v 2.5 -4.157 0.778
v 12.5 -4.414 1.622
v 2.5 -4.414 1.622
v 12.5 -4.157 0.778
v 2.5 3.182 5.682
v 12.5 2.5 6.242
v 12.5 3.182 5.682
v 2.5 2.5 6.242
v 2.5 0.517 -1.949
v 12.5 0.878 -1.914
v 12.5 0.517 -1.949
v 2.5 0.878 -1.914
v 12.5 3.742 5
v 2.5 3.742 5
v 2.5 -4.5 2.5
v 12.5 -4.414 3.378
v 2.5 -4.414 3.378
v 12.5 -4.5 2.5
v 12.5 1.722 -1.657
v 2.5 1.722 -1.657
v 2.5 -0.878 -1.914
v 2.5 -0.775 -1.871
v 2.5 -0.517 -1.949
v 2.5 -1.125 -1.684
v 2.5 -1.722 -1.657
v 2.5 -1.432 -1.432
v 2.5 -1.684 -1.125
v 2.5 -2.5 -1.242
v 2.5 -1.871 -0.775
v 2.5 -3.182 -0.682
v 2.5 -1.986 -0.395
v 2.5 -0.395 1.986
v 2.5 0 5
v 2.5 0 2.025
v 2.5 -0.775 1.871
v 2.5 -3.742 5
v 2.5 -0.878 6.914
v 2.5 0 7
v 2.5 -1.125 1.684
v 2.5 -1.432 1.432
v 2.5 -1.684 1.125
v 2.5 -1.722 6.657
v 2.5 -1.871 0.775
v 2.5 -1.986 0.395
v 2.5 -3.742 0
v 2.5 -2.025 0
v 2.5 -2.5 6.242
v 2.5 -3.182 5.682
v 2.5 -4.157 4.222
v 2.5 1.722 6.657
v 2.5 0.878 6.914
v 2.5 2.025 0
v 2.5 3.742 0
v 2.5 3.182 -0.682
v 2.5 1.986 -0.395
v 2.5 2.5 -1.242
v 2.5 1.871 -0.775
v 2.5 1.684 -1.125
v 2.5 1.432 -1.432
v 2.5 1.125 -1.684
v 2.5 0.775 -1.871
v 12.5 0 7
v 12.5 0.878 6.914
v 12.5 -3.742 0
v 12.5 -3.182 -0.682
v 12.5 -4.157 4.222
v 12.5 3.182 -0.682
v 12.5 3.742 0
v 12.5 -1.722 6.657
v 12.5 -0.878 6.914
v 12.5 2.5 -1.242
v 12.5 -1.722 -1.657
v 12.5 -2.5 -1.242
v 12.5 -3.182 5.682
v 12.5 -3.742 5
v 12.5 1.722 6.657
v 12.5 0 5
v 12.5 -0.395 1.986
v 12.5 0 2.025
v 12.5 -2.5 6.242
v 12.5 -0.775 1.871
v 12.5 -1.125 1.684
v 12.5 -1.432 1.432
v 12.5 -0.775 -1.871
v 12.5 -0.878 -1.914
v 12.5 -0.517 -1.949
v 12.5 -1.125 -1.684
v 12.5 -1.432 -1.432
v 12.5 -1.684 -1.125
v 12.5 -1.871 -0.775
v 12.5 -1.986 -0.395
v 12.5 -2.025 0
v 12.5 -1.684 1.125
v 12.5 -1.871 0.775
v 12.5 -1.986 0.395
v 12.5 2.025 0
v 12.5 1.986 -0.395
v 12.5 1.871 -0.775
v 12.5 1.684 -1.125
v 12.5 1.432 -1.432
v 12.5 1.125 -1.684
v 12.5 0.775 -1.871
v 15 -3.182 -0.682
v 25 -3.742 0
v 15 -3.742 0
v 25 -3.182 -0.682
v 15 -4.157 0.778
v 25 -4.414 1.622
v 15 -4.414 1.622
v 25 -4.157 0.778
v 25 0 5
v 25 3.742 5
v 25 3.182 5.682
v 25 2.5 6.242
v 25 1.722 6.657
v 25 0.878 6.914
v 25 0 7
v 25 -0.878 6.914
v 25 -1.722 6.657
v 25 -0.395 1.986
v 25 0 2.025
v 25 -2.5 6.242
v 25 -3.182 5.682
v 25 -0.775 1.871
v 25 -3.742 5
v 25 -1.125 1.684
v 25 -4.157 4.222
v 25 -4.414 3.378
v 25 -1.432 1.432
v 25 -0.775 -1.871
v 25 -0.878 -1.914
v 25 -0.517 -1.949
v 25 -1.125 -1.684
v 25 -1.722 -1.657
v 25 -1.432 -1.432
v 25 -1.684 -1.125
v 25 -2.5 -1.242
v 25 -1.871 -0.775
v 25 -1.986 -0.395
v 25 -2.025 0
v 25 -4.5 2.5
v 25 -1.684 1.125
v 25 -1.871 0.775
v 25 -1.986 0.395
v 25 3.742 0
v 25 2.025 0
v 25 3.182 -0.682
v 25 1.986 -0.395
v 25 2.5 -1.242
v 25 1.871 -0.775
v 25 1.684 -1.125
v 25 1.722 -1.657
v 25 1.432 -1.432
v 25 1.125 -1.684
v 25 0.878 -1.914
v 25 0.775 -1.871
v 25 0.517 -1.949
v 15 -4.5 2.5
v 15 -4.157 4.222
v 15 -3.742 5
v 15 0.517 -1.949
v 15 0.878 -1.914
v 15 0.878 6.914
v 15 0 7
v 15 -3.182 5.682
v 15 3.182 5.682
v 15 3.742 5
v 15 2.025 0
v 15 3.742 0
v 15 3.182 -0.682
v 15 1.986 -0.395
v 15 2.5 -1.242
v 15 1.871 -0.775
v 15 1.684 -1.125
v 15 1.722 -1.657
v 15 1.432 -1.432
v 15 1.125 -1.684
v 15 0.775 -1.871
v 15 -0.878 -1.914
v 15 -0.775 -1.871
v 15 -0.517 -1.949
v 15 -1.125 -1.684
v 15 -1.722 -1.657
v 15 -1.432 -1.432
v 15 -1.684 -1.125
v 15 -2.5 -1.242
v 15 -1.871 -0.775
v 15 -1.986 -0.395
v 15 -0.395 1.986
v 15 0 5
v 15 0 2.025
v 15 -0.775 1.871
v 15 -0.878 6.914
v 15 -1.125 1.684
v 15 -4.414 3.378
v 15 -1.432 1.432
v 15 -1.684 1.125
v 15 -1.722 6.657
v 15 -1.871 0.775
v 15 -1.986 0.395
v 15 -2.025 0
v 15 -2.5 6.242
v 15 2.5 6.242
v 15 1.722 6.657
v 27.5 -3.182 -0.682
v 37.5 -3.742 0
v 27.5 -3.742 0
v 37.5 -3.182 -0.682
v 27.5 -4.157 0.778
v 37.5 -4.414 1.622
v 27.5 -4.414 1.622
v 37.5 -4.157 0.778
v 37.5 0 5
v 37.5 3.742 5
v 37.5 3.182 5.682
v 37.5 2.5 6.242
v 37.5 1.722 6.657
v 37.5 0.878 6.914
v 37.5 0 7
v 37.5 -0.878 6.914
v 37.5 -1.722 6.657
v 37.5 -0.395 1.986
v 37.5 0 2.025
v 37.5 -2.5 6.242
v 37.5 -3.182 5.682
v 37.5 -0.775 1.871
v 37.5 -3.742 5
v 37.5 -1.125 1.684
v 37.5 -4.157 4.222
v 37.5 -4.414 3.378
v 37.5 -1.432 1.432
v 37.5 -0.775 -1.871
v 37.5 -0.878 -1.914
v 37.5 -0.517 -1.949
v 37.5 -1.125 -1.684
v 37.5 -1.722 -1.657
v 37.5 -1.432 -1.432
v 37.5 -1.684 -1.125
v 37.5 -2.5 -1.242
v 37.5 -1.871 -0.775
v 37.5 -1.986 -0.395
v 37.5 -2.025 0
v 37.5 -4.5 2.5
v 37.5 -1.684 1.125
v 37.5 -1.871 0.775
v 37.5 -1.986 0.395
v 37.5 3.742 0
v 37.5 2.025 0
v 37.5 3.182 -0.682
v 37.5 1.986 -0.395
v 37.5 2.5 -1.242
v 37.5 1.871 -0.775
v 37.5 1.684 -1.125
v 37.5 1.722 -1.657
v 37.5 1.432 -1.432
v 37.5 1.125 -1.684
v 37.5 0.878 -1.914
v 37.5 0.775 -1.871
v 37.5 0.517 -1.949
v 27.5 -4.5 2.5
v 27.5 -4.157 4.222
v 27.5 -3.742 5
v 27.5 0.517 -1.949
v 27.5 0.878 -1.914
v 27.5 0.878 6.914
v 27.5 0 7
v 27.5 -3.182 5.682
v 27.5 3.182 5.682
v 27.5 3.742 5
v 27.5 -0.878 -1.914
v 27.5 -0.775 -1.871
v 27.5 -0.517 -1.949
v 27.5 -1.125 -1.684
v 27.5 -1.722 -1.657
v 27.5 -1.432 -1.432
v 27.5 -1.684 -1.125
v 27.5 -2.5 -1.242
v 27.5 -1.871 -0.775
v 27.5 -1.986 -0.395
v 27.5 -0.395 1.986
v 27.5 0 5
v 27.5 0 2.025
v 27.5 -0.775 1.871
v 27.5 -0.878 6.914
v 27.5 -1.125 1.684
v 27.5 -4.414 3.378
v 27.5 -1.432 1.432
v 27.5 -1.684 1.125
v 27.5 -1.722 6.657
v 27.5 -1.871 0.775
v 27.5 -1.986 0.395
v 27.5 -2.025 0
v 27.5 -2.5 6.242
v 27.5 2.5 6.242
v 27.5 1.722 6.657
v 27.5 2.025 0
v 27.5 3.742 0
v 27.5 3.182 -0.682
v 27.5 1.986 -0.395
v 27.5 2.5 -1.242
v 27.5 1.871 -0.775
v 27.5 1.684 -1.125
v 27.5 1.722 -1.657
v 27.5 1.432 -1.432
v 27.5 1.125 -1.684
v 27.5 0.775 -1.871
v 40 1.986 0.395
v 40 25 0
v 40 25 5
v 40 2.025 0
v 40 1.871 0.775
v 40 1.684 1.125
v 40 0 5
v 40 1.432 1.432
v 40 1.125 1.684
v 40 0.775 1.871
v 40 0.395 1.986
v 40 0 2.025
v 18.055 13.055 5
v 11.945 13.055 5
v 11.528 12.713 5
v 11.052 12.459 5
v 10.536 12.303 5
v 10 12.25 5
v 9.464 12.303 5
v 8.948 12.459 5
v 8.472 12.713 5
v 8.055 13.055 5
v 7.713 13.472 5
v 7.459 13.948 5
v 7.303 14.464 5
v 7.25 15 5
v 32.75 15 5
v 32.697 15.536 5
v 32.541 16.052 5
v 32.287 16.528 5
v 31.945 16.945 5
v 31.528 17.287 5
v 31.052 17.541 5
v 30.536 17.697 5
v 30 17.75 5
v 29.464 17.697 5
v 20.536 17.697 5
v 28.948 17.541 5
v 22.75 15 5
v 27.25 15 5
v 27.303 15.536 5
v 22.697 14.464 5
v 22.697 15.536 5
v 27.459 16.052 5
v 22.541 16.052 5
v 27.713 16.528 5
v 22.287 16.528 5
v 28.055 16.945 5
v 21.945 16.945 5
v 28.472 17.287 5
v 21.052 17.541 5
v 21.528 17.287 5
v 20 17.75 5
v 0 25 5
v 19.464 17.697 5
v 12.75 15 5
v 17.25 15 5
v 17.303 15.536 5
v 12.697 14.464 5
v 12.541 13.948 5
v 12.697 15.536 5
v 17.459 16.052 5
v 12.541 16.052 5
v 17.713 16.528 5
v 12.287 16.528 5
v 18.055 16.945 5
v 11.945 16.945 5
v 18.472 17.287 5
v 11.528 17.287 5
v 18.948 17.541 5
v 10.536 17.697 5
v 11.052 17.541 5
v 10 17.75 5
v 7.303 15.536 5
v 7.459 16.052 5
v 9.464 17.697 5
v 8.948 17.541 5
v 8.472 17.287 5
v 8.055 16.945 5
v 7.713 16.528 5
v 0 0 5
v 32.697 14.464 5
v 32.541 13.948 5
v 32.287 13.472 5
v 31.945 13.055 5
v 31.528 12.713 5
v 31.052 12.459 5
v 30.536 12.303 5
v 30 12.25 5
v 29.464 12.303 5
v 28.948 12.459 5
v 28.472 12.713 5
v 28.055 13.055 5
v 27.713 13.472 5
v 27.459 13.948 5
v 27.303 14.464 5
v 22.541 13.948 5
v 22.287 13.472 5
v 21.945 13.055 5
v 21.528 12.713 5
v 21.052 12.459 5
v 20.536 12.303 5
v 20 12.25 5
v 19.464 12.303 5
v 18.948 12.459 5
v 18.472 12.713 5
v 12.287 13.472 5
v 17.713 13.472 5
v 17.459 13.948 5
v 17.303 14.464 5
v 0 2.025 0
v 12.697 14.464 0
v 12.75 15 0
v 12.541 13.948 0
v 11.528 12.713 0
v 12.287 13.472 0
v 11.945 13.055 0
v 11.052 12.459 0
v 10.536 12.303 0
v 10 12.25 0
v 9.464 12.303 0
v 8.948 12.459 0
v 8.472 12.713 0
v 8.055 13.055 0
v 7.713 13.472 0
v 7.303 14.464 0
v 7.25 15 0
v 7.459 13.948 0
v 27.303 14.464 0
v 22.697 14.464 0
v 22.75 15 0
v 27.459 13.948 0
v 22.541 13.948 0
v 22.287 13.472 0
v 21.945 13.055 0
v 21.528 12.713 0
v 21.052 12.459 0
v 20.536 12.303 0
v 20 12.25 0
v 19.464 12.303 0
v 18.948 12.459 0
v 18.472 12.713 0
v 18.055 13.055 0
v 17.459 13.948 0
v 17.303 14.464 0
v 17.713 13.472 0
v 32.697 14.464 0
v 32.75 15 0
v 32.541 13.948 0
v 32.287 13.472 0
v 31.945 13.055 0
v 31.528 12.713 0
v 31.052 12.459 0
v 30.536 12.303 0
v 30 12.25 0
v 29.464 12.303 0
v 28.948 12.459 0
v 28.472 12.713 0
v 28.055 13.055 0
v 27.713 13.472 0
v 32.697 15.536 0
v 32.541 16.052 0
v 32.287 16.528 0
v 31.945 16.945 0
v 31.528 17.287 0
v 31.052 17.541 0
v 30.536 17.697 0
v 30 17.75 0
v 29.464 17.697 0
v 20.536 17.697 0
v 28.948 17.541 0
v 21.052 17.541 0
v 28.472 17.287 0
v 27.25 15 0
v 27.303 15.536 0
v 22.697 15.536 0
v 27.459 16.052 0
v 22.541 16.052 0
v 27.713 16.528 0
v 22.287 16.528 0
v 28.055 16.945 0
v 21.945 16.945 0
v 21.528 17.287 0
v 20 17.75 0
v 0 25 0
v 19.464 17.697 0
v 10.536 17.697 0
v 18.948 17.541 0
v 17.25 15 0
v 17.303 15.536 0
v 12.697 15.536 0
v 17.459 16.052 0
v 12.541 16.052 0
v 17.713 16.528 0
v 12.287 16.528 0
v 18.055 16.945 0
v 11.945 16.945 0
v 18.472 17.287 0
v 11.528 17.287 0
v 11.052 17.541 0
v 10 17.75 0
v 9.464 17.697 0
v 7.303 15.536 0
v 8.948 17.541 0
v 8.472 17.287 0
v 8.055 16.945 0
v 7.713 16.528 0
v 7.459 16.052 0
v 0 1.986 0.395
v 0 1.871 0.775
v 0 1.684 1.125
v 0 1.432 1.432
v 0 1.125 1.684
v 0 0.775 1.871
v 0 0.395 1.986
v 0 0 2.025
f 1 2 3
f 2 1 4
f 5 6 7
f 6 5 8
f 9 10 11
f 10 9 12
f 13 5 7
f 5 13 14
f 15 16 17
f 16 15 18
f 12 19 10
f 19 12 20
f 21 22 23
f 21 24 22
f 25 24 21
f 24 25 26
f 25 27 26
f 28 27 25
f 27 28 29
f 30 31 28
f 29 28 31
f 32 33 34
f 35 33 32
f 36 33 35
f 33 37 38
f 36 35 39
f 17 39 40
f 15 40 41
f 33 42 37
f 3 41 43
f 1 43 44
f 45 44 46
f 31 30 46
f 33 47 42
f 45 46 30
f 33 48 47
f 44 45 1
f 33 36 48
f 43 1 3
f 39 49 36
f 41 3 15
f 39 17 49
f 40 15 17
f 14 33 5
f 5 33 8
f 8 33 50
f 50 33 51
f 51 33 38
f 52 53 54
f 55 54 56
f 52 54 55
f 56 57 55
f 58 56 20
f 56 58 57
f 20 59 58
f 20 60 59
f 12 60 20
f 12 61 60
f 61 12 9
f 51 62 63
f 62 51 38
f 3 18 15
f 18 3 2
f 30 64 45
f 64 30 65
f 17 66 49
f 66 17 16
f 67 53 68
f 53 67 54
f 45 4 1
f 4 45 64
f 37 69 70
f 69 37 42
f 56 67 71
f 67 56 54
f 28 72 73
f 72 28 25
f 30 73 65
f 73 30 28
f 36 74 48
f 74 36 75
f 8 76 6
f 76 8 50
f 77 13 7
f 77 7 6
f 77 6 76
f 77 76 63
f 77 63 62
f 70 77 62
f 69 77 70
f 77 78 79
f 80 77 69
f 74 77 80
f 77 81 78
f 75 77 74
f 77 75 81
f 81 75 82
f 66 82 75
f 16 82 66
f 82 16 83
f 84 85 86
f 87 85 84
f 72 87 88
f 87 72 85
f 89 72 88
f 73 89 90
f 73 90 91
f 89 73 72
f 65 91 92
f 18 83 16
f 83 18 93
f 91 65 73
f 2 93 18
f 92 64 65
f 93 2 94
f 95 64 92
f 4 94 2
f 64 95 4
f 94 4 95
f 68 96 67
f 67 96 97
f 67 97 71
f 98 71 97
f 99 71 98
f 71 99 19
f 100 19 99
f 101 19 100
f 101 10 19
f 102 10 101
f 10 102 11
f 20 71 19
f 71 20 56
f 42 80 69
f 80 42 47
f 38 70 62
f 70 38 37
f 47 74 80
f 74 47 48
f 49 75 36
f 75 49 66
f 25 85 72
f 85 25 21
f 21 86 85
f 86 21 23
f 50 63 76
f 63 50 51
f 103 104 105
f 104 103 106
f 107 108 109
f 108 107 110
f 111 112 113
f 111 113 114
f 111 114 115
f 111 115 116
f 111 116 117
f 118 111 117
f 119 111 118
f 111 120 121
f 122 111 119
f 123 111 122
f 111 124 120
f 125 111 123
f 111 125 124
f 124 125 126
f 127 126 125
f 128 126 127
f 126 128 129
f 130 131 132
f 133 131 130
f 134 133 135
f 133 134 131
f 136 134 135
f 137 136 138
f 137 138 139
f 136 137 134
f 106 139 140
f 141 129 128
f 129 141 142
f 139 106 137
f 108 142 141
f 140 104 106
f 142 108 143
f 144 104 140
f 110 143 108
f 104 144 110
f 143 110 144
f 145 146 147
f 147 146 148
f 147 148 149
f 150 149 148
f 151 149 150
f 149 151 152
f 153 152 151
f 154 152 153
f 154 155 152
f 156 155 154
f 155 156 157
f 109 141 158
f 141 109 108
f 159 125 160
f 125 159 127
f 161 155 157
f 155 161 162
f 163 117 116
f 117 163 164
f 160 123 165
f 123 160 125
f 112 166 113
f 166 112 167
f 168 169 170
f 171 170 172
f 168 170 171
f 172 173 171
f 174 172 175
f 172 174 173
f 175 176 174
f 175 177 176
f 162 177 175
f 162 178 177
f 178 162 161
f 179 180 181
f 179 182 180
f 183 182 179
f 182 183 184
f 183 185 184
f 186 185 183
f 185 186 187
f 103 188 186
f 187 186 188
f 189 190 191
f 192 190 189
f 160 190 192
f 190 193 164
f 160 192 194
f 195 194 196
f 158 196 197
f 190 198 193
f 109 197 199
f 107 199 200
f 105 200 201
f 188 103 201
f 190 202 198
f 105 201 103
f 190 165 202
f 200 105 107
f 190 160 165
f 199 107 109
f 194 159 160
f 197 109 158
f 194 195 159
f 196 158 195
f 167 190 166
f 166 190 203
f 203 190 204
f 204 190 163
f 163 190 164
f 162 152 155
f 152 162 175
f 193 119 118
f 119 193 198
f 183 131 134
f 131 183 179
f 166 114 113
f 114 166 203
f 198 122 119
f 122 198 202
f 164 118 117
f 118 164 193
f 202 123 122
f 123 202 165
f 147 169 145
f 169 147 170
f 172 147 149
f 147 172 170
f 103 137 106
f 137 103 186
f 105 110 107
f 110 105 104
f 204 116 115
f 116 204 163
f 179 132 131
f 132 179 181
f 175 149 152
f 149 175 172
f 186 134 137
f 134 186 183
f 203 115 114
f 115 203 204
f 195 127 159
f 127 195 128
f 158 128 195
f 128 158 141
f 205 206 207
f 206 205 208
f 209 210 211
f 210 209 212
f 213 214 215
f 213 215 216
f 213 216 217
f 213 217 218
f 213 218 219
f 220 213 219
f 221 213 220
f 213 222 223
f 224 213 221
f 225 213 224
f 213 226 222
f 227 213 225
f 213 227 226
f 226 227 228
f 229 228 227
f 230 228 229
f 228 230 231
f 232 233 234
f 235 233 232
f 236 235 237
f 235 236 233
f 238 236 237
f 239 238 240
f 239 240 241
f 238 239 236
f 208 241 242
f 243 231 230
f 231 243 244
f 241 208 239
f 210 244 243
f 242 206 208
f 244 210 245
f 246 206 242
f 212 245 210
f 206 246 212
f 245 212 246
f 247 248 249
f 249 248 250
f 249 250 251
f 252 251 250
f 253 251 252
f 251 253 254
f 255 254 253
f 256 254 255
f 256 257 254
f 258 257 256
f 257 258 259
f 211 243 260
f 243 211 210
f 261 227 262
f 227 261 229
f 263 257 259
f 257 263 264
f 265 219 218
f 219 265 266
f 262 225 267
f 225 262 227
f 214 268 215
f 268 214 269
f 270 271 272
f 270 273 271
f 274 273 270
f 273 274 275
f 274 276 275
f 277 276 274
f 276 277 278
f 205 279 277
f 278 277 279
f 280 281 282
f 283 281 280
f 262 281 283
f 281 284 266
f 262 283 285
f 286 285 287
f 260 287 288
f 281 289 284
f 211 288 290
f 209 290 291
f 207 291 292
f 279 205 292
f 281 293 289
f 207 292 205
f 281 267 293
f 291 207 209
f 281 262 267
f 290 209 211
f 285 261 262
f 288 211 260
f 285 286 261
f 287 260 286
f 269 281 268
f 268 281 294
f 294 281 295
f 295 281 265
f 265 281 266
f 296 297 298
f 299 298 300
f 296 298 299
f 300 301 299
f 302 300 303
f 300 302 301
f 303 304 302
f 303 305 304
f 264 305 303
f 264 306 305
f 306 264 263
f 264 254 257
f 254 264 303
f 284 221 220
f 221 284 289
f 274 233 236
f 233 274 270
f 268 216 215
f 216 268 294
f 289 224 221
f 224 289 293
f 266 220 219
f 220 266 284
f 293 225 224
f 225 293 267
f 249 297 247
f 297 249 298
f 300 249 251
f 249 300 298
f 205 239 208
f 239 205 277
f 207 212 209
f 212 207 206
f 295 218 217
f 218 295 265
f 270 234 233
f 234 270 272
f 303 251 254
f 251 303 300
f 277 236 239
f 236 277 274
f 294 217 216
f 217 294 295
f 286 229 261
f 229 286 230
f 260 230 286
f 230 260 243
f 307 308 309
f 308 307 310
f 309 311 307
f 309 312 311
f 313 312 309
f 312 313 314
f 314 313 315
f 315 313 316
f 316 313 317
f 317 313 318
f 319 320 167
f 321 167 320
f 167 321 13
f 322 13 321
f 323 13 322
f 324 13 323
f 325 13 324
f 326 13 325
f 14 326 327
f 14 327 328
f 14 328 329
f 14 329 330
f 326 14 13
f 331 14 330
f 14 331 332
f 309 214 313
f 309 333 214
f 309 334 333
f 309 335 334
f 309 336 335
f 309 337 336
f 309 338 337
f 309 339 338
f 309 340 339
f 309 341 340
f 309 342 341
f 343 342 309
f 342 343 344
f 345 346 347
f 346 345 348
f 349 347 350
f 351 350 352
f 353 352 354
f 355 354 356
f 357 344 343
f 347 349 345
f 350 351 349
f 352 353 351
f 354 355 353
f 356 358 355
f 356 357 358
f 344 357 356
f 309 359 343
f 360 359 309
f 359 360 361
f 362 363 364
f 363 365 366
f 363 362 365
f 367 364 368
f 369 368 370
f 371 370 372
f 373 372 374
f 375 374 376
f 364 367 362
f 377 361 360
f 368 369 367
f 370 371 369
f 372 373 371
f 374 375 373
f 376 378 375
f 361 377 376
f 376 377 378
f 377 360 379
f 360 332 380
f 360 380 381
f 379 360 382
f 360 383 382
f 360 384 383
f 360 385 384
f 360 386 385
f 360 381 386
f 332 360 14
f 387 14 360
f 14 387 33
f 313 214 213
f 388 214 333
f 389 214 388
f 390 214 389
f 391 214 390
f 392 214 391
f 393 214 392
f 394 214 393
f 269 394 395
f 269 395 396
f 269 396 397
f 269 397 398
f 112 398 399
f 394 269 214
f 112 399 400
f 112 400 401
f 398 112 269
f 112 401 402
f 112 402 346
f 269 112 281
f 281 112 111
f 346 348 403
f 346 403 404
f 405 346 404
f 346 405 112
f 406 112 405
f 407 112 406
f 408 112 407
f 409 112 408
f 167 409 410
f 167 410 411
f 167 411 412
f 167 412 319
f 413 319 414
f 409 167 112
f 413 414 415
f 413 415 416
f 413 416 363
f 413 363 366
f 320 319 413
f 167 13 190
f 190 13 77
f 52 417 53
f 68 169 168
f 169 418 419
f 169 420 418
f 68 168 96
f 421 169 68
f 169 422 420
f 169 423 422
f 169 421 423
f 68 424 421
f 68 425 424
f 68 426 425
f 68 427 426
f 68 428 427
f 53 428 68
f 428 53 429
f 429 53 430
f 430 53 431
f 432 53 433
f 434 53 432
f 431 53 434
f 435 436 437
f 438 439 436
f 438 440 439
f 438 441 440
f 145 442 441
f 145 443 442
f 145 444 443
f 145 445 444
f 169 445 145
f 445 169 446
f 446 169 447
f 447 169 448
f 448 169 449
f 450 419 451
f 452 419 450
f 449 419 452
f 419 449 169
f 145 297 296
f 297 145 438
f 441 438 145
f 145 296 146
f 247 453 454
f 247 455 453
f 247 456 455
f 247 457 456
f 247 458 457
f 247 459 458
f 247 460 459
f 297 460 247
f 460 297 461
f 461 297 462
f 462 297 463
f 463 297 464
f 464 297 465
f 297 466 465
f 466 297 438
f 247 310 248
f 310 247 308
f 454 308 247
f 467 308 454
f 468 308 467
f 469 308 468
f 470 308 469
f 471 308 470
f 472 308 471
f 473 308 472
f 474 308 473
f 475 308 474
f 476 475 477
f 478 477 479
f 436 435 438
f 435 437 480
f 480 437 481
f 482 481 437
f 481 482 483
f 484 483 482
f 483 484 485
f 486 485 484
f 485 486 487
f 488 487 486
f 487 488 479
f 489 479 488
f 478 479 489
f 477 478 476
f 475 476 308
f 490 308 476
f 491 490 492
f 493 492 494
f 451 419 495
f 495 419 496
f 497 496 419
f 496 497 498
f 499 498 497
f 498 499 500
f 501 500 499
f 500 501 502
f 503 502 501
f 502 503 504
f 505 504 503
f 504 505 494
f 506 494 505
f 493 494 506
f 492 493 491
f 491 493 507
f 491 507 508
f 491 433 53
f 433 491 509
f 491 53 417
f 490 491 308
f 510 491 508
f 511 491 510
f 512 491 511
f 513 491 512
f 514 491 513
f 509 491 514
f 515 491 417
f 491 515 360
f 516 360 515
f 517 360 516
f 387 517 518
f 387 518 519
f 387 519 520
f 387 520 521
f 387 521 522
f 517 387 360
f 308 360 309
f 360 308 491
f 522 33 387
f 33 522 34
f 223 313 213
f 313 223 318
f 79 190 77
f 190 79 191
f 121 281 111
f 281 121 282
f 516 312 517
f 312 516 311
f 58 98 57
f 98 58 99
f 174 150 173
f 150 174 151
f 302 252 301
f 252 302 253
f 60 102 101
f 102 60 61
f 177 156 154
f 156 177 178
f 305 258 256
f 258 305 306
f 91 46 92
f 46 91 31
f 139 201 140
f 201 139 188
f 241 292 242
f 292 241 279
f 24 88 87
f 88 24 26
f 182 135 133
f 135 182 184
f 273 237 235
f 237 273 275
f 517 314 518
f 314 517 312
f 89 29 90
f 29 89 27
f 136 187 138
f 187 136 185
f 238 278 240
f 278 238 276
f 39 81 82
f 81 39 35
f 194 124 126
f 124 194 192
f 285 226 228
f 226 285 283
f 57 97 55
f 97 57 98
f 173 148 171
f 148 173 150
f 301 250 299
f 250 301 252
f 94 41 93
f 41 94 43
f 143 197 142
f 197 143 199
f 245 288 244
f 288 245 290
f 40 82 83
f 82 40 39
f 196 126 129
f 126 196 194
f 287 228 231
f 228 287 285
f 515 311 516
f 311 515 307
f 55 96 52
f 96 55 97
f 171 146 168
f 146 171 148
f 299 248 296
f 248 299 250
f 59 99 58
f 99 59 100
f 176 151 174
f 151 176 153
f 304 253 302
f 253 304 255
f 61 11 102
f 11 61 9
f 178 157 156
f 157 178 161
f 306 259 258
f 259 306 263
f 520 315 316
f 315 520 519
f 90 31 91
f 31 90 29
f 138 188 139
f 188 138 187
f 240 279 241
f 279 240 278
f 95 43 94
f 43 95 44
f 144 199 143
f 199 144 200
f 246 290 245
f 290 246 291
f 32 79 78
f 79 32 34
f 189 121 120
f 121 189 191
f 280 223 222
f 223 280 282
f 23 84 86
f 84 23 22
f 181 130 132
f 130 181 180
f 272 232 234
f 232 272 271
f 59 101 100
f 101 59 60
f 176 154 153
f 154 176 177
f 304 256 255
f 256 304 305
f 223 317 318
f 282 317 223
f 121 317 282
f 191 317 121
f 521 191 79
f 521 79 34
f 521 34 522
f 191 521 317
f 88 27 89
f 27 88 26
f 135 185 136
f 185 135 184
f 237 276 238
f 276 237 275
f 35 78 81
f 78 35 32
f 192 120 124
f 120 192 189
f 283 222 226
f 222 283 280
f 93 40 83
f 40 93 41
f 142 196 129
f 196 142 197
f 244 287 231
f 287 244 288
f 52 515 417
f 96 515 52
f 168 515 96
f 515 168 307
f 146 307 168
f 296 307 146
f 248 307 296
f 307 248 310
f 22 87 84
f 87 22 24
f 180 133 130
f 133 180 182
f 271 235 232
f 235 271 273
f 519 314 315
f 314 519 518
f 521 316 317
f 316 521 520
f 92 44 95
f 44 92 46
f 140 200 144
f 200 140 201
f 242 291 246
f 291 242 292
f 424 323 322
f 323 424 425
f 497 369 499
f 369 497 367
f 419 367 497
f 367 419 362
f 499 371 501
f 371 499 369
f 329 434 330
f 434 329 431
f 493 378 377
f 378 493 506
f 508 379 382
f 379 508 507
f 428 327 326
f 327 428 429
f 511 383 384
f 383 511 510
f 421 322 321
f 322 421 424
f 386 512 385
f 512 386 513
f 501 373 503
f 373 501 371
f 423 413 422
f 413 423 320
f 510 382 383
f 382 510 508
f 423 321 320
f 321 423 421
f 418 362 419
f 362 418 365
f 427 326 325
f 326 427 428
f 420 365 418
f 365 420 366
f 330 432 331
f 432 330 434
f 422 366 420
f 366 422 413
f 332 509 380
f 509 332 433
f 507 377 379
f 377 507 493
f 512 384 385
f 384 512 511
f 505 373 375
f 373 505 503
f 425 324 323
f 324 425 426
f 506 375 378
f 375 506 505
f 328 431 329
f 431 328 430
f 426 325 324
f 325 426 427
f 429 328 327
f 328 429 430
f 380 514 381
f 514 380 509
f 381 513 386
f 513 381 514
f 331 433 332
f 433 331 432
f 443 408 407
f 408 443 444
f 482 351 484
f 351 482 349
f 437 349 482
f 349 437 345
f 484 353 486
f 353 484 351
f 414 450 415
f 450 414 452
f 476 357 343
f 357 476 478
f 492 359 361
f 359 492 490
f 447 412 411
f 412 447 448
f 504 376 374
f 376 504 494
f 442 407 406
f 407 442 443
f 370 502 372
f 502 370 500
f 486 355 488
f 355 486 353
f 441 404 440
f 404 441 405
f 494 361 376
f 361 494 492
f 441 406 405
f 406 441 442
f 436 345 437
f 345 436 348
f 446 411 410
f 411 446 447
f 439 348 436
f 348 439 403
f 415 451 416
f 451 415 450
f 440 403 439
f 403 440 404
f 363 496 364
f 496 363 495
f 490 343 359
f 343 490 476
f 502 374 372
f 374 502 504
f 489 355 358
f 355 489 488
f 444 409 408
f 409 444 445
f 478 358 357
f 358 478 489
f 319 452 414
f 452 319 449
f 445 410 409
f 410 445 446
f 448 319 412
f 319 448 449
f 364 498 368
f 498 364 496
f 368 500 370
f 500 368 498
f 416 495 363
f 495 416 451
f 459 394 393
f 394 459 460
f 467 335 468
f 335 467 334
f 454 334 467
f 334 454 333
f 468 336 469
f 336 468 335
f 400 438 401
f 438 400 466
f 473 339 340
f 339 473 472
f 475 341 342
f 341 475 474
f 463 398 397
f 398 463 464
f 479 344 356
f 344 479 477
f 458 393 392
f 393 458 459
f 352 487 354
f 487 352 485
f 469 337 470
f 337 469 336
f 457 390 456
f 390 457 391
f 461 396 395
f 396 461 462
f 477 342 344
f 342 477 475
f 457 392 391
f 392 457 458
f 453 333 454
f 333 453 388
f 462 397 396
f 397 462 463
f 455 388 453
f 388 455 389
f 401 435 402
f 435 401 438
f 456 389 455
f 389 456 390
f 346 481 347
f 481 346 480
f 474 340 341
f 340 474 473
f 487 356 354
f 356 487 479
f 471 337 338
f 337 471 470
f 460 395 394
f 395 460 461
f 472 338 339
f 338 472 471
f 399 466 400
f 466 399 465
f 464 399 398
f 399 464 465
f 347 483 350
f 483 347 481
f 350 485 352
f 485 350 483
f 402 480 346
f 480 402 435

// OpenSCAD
$fn = 32;

// ----------------------------------------------------------------------
// Hinge leaf: 40 x 29.5 x 9 mm
// ----------------------------------------------------------------------

// --- parameters (mm) ---
leaf_len = 40;            // leaf length, X
leaf_w = 25;              // leaf width, Y
leaf_t = 5;               // leaf thickness
knuckle_d = 9;            // knuckle diameter
knuckle_w = 10;           // knuckle width
knuckle_n = 3;            // number of knuckles
pin_d = 4.05;             // pin bore
gap = 2.5;                // gap between the knuckles
screw_d = 5.5;            // screw clearance

module leaf() {
  cube([leaf_len, leaf_w, leaf_t]);
}

module knuckles() {
  /* barrels sit on the leaf edge, the pin axis at half the leaf thickness */
  for (i = [0 : knuckle_n - 1])
    translate([gap + i * (knuckle_w + gap), 0, leaf_t * 0.5])
      rotate([0, 90, 0]) cylinder(h = knuckle_w, d = knuckle_d);
}

difference() {
  union() {
    leaf();
    knuckles();
  }
  rotate([0, 90, 0]) translate([0, 0, -1])
    cylinder(h = leaf_len + 2, d = pin_d);
  translate([10, leaf_w * 0.6, -1]) cylinder(h = leaf_t + 2, d = screw_d);
  translate([20, leaf_w * 0.6, -1]) cylinder(h = leaf_t + 2, d = screw_d);
  translate([30, leaf_w * 0.6, -1]) cylinder(h = leaf_t + 2, d = screw_d);
}
